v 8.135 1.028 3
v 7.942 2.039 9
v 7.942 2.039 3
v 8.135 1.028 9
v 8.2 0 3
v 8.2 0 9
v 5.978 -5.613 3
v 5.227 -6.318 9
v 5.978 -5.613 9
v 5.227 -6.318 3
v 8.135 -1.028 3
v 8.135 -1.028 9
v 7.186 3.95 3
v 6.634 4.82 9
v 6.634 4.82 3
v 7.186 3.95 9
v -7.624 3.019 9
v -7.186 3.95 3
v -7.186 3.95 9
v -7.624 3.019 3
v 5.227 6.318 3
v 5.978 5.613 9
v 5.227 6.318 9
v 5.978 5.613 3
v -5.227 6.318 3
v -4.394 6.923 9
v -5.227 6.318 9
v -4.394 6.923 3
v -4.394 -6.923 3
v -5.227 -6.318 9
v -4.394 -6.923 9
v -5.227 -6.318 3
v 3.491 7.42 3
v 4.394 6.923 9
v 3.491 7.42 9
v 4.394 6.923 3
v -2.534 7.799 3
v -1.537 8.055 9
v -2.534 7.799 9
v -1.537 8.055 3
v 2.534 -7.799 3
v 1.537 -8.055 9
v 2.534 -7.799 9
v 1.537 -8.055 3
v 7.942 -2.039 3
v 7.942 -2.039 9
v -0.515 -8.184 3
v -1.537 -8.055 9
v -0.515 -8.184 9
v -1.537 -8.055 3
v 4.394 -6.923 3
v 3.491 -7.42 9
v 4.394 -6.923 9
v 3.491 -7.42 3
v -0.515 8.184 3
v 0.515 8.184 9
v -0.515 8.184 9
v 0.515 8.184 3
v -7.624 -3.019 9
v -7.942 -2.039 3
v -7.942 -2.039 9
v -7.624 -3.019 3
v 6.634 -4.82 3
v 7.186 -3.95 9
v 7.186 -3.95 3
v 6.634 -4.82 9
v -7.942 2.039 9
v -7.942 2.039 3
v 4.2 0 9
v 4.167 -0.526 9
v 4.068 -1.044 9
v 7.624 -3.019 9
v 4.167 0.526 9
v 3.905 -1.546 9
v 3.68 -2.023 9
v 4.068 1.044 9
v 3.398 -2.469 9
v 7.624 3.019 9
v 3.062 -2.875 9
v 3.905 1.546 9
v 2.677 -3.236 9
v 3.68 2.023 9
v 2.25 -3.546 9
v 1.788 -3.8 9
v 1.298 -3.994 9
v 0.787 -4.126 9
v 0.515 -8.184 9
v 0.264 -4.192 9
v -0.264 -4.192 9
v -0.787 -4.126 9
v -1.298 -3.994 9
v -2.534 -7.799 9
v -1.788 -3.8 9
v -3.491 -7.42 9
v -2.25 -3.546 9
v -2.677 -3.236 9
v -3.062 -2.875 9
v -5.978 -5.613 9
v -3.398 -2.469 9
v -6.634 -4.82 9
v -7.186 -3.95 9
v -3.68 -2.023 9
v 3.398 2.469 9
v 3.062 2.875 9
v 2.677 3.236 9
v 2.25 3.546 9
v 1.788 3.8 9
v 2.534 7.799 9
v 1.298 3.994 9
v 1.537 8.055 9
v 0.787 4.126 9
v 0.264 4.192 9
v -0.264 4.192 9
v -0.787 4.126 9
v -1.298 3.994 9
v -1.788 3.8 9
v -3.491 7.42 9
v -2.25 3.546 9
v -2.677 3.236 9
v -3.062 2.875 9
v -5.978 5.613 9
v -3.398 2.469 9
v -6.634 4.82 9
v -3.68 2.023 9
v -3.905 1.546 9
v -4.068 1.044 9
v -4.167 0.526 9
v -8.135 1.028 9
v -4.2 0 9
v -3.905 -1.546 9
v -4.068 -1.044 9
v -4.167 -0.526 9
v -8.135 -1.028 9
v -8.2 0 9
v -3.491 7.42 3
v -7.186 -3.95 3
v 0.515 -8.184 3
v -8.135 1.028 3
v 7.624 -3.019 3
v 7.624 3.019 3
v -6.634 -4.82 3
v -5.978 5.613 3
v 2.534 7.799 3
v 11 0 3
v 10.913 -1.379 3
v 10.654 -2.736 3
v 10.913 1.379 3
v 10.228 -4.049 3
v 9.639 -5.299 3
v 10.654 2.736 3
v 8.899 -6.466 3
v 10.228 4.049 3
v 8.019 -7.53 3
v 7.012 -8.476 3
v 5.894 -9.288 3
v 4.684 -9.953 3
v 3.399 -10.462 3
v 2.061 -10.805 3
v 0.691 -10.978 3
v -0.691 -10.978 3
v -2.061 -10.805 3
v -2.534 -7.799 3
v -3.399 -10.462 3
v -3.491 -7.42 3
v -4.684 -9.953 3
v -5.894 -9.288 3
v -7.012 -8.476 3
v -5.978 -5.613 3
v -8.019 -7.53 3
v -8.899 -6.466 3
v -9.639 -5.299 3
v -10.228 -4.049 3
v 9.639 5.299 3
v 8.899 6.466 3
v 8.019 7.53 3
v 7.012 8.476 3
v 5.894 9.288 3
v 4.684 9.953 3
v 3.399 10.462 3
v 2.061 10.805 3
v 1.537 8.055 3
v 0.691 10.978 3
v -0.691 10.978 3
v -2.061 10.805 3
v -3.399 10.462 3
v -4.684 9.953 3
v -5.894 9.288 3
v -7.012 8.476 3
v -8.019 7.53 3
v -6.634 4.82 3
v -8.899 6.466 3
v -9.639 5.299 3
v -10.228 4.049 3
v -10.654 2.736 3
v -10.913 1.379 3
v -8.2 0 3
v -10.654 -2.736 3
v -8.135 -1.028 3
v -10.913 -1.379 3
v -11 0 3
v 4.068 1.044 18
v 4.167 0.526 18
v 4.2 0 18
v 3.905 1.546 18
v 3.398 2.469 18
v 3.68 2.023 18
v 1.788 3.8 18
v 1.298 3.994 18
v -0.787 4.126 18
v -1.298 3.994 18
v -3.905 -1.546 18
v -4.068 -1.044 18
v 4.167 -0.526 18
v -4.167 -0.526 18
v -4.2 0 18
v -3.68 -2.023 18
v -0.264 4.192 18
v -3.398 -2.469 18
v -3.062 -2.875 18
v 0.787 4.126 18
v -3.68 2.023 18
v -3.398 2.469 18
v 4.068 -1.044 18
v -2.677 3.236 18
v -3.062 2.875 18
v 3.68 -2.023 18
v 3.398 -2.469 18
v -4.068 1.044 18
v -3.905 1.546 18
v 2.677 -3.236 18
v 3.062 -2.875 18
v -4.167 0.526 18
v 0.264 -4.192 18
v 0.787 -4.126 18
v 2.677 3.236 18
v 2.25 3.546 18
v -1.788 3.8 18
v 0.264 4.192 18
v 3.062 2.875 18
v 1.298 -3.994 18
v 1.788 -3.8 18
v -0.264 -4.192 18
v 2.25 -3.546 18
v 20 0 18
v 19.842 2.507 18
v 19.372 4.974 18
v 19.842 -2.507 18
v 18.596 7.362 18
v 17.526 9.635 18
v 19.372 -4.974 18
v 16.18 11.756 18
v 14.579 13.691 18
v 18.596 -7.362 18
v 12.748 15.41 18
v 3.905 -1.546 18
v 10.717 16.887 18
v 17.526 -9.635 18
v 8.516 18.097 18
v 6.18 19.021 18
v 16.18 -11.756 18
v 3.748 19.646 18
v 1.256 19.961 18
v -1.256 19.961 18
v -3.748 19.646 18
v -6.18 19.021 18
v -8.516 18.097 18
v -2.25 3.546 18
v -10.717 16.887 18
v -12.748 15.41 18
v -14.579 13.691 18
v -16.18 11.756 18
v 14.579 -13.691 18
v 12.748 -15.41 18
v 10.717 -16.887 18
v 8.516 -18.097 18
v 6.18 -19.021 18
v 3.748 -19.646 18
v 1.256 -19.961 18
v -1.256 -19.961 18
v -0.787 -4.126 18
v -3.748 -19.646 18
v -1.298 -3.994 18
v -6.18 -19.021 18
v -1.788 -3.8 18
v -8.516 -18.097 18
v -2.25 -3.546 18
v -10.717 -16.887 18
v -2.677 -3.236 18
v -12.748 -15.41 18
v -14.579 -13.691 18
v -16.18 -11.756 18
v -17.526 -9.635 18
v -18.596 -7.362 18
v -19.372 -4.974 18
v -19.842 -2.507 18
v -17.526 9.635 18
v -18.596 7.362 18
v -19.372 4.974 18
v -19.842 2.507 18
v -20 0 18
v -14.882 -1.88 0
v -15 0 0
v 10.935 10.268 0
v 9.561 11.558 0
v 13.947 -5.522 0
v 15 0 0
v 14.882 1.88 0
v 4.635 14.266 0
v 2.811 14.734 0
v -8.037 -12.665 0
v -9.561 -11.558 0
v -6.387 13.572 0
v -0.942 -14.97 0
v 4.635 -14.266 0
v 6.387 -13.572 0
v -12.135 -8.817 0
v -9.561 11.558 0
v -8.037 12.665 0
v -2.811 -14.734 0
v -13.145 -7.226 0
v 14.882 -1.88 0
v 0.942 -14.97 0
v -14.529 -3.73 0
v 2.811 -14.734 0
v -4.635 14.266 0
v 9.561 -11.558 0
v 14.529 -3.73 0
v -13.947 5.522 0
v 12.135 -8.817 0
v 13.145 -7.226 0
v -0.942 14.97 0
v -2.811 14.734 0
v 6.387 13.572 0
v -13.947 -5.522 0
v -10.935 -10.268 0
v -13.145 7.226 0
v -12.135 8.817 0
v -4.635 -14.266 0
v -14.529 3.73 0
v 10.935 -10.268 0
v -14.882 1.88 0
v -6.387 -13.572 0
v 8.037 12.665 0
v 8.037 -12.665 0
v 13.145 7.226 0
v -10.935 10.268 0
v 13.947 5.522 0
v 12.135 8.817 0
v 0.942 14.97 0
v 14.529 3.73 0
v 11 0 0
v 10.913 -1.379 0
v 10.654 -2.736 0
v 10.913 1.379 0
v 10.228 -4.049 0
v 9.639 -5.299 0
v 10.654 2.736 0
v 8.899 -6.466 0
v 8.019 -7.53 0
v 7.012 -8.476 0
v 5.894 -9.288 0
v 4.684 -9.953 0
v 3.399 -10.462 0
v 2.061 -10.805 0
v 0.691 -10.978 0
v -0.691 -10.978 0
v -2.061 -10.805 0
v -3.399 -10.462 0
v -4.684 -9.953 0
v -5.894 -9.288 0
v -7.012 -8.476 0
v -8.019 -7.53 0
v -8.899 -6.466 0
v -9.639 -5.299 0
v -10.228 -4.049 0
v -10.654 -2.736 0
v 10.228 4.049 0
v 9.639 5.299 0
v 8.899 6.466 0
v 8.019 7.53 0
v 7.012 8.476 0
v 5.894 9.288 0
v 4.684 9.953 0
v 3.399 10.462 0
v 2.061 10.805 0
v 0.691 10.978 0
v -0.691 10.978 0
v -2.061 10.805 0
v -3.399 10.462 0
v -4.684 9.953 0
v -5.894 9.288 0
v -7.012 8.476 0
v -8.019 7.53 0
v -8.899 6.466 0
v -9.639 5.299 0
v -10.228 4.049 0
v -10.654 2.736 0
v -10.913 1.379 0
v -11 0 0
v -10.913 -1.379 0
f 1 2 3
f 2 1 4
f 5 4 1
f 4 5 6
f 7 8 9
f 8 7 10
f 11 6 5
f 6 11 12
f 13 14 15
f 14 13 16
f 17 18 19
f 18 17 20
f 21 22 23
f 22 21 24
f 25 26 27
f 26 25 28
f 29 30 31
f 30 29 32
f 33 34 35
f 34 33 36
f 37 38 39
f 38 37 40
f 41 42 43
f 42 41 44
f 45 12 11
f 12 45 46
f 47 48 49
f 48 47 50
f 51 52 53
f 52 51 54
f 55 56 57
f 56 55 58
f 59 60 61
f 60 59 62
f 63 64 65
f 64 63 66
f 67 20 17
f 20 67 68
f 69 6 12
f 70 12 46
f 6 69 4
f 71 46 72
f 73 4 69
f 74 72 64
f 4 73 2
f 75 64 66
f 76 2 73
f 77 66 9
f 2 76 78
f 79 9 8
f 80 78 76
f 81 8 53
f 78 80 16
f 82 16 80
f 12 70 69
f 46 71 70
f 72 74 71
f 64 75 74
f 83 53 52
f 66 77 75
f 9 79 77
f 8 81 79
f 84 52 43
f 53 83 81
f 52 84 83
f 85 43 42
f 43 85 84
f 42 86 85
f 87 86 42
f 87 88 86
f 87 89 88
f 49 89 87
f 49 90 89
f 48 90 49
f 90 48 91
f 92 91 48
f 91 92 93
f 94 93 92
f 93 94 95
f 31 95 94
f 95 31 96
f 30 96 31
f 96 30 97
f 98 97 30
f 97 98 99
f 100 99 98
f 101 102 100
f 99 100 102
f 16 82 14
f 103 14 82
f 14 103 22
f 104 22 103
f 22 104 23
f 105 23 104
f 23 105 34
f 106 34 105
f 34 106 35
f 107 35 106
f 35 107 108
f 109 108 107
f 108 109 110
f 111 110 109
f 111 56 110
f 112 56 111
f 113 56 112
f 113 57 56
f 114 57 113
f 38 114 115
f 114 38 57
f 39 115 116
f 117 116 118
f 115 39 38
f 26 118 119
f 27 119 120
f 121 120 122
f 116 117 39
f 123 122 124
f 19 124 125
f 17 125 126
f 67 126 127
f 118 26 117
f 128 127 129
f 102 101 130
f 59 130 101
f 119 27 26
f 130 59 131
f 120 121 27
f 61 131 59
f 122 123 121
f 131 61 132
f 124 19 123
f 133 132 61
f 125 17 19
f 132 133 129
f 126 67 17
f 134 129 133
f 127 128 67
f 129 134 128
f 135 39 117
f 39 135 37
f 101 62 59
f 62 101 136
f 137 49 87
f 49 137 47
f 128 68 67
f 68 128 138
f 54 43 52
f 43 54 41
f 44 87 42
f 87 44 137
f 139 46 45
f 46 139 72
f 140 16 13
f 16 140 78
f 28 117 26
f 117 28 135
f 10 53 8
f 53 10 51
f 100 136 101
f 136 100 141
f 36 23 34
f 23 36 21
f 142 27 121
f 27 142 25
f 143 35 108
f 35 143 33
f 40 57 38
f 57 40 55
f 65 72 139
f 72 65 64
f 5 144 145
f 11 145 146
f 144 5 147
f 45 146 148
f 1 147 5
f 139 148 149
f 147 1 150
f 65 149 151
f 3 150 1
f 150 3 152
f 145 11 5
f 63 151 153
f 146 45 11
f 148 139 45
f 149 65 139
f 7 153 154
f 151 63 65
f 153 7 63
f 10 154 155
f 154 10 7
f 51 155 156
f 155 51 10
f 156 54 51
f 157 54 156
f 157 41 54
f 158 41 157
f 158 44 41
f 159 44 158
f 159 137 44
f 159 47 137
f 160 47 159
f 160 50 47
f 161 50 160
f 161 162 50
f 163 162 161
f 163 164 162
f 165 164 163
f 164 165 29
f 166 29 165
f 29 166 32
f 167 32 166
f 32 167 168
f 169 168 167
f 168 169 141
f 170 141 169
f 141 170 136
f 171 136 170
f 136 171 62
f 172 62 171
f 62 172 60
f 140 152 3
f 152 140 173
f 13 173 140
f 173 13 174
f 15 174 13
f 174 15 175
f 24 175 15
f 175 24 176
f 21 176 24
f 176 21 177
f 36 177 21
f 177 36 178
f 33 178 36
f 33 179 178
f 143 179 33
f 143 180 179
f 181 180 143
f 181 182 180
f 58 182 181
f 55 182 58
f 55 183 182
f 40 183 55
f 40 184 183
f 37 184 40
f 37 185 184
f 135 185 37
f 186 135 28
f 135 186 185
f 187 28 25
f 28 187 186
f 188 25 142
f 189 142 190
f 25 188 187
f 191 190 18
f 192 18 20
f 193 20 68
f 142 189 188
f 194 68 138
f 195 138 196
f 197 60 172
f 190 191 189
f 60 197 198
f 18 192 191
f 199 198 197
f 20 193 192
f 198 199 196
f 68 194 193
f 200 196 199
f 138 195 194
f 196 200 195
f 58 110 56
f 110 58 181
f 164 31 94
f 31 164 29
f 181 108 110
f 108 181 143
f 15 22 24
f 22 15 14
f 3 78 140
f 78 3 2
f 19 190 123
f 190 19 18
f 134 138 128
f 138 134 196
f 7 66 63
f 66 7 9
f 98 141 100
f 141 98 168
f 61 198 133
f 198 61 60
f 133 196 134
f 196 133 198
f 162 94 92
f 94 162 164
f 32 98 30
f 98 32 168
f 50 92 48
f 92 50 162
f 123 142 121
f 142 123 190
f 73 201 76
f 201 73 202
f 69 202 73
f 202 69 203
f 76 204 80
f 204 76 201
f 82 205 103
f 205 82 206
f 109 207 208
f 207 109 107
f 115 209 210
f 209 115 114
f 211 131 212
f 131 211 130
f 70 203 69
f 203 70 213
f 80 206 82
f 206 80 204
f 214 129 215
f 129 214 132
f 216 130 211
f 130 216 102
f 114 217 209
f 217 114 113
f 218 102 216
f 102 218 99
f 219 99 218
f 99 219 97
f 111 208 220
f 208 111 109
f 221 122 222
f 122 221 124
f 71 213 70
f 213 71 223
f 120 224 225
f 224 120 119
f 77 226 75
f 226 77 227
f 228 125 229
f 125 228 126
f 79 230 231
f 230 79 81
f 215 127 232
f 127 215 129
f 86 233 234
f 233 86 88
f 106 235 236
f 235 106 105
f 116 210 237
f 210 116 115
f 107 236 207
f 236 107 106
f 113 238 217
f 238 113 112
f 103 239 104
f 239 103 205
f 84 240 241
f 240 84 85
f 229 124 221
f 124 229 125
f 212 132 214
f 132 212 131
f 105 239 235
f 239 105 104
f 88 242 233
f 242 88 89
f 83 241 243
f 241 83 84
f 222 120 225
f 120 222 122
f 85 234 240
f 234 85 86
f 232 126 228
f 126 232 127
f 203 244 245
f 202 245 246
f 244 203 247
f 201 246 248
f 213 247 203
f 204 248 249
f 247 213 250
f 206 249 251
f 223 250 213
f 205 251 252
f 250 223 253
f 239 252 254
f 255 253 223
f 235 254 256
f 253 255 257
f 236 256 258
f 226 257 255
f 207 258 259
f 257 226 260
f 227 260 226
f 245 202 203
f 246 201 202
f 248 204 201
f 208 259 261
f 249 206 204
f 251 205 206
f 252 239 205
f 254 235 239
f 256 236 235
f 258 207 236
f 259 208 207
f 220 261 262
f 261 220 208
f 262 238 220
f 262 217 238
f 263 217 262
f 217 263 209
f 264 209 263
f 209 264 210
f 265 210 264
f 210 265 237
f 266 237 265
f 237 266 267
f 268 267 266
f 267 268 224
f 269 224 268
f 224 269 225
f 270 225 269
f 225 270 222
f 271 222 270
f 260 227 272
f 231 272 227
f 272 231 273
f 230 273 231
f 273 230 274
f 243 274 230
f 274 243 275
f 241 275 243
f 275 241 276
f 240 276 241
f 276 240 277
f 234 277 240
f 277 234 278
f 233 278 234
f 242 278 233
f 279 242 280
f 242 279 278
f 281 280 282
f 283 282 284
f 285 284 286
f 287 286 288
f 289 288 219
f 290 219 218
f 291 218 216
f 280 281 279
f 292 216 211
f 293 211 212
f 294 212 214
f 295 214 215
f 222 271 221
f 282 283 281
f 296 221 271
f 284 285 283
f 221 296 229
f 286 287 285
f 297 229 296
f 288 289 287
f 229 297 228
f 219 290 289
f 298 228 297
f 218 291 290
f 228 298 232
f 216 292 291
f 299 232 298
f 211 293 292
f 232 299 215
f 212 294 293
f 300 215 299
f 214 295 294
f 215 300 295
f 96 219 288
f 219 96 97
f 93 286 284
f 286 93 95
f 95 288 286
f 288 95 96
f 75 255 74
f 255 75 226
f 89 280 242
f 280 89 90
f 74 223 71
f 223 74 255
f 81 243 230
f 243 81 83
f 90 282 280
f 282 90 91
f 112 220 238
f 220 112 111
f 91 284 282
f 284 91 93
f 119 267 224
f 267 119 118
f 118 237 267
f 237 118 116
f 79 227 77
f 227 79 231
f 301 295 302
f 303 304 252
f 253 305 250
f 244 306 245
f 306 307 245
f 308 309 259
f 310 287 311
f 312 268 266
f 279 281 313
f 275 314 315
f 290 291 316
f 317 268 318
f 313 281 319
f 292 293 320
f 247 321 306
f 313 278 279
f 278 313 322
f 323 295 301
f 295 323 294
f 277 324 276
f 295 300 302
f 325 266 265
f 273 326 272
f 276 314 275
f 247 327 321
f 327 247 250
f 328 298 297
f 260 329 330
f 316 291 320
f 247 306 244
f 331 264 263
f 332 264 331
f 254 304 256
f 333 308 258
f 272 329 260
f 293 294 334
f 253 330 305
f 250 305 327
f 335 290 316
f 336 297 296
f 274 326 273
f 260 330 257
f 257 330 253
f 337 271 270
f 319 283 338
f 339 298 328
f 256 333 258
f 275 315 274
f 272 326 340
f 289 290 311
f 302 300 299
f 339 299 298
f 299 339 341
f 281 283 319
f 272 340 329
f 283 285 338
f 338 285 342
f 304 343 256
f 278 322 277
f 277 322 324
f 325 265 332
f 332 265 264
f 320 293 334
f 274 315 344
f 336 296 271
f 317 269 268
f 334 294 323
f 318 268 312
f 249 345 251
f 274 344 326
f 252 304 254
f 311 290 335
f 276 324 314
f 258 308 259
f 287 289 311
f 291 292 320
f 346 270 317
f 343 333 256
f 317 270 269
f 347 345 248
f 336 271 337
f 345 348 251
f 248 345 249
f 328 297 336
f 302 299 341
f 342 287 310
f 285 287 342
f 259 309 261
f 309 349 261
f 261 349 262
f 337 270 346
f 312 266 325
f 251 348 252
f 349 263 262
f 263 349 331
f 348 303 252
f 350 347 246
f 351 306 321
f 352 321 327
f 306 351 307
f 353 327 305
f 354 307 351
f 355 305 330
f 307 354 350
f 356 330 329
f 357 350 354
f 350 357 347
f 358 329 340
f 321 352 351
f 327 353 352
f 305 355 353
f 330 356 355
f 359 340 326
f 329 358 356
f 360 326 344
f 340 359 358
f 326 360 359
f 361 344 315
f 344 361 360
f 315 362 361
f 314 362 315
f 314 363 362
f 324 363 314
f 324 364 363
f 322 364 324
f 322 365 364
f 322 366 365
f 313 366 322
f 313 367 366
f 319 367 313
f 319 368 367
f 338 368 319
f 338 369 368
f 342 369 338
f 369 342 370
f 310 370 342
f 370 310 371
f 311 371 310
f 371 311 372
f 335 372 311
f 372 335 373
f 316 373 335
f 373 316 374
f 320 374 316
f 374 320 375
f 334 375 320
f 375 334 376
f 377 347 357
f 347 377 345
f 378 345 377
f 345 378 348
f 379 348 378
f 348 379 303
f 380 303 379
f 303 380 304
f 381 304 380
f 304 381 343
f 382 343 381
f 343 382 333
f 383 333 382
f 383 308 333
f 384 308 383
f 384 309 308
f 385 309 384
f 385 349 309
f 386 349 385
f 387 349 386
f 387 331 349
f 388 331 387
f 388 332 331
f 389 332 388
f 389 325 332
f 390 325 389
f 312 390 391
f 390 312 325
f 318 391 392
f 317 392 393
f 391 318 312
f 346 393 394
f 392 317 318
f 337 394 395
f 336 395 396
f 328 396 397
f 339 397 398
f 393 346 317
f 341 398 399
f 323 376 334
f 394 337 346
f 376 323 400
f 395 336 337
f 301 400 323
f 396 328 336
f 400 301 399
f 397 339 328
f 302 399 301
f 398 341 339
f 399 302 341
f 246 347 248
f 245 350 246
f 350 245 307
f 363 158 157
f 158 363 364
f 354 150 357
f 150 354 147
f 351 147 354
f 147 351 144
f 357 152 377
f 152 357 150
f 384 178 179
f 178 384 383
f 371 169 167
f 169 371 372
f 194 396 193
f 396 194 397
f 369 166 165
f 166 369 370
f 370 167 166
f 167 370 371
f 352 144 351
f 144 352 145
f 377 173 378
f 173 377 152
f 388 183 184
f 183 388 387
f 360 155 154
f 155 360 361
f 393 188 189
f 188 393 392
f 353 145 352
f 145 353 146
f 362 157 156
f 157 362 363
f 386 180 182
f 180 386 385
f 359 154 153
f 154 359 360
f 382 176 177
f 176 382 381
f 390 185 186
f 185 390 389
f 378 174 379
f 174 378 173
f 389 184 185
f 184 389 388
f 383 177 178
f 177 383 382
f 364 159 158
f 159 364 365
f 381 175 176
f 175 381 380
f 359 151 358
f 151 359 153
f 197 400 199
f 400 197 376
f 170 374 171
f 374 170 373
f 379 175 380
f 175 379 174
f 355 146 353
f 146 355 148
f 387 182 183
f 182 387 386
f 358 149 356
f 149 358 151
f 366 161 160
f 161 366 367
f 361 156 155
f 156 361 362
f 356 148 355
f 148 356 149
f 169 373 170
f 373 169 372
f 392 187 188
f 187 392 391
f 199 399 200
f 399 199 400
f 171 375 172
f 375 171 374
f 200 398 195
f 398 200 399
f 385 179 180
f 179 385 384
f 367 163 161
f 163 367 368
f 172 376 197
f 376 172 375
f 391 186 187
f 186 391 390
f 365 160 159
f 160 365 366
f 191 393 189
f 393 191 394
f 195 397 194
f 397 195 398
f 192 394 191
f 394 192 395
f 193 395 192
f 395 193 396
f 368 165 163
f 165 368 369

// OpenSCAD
// file: lib/utils.scad
include <params.scad>;

function tol(val) = val - tolerance;

module cone(r, angle, invert=false) {
    h = tan((180 - angle) / 2) * r;
    translate([0, 0, -h]) {
        if (invert) {
                cylinder(r1=r,r2=0,h=h, $fn=20); 
        } else {
            cylinder(r1=0,r2=r,h=h, $fn=20); 
        }
    }
}

module roundrect(vect, r, $fn=20) {
    sq = len(vect) > 1
        ? [for (i = [0:1:len(vect)-1]) vect[i] - r * 2]
        : vect - r * 2;
    minkowski() {
        square(sq);
        translate([r, r])
            circle(r=r);
    }
}

module profile($fn=20) {
    minkowski() {
        translate([fan_case_radius, fan_case_radius, 0])
            square(fan_case - fan_case_radius * 2);
        circle(fan_case_radius, $fn);
    }
}

module fan_mount_points(radius, $fn=20) {
    offset = (fan_case - fan_screw_distance) / 2;
    translate([offset, offset, 0]) {
        circle(radius, $fn);
        translate([fan_screw_distance, 0, 0])
            circle(radius, $fn);
        translate([fan_screw_distance, fan_screw_distance, 0])
            circle(radius, $fn);
        translate([0, fan_screw_distance, 0])
            circle(radius, $fn);
    }
}

module square_grill(width, height, fin_width, fin_count) {
    fin_spacing = width / fin_count;
    difference() {
        square(width);
        union() {
            for (i = [0:1:fin_count]) {
                translate([(i + 1) * fin_spacing - (fin_spacing / 2) - (fin_width / 2), 0, 0])
                    square([fin_width, height]);
            }
        }
    }
}

function inch_to_mm(inches) = inches * 25.4;
// file: lib/params.scad
fan_case = 120;
fan_screw_distance = 105;
fan_case_depth = 25;
fan_case_radius = 5;
fan_case_screw_radius = 2.5;
fan_case_socket_cap_radius = 5.6 / 2;
fan_case_screw_head_radius = 3;
fan_case_screw_head_angle = 90;

grill_screw_size = 3;
grill_screw_radius = grill_screw_size / 2;
grill_screw_inset = 2;
grill_radius = 114 / 2;
grill_fin_offset = 10;
grill_fin_thickness = 2;
grill_fin_degrees = 30;

rear_grill_thickness = 2;

front_grill_thickness = 2;
front_grill_fin_count = 6;
front_grill_fin_thickness = 2;

filter_thickness = 5;
filter_width = fan_screw_distance - fan_case_screw_radius * 3;
filter_offset = (fan_case - filter_width) / 2;

base_retainer_thickness = 2;
base_height = 30;
base_cut_offset = 10;
base_retainer_inset = 4;

adapter_thickness = 2;
adapter_duct_in = 4;
adapter_height = 14;
adapter_duct_height = 50;
flat_adapter_duct_height = 50;
flat_adapter_screw_radius = 2;
flat_adapter_screw_head_radius = 4;

caddy_thickness = 2;
caddy_handle_width = 20;
caddy_handle_depth = 10;
caddy_handle_grip_count = 5;
caddy_handle_grip_depth = 1;
caddy_handle_grip_width = 1;
caddy_clip_height = 2;
caddy_clip_depth = 6;
caddy_clip_offset = 1;

foot_lower_radius = 15;
foot_upper_radius = 20;
foot_height = 18;
foot_inset_radius = 4;
foot_inset_depth = 3;
foot_screw_radius = 4;
foot_screw_inset = 6;
foot_screw_head_radius = 8;

tolerance = 0.2;
// main file
include <lib/params.scad>;
use <lib/utils.scad>;

$fn=50;

difference() {
    cylinder(r1=foot_lower_radius, r2=foot_upper_radius, h=foot_height);
    cylinder(r=foot_lower_radius-foot_inset_radius, h=foot_inset_depth);
    union() {
        translate([0, 0, foot_inset_depth])
            cylinder(r=foot_screw_head_radius+tolerance, h=foot_screw_inset);
        cylinder(r=foot_screw_radius+tolerance, h=foot_height);
    }
}
